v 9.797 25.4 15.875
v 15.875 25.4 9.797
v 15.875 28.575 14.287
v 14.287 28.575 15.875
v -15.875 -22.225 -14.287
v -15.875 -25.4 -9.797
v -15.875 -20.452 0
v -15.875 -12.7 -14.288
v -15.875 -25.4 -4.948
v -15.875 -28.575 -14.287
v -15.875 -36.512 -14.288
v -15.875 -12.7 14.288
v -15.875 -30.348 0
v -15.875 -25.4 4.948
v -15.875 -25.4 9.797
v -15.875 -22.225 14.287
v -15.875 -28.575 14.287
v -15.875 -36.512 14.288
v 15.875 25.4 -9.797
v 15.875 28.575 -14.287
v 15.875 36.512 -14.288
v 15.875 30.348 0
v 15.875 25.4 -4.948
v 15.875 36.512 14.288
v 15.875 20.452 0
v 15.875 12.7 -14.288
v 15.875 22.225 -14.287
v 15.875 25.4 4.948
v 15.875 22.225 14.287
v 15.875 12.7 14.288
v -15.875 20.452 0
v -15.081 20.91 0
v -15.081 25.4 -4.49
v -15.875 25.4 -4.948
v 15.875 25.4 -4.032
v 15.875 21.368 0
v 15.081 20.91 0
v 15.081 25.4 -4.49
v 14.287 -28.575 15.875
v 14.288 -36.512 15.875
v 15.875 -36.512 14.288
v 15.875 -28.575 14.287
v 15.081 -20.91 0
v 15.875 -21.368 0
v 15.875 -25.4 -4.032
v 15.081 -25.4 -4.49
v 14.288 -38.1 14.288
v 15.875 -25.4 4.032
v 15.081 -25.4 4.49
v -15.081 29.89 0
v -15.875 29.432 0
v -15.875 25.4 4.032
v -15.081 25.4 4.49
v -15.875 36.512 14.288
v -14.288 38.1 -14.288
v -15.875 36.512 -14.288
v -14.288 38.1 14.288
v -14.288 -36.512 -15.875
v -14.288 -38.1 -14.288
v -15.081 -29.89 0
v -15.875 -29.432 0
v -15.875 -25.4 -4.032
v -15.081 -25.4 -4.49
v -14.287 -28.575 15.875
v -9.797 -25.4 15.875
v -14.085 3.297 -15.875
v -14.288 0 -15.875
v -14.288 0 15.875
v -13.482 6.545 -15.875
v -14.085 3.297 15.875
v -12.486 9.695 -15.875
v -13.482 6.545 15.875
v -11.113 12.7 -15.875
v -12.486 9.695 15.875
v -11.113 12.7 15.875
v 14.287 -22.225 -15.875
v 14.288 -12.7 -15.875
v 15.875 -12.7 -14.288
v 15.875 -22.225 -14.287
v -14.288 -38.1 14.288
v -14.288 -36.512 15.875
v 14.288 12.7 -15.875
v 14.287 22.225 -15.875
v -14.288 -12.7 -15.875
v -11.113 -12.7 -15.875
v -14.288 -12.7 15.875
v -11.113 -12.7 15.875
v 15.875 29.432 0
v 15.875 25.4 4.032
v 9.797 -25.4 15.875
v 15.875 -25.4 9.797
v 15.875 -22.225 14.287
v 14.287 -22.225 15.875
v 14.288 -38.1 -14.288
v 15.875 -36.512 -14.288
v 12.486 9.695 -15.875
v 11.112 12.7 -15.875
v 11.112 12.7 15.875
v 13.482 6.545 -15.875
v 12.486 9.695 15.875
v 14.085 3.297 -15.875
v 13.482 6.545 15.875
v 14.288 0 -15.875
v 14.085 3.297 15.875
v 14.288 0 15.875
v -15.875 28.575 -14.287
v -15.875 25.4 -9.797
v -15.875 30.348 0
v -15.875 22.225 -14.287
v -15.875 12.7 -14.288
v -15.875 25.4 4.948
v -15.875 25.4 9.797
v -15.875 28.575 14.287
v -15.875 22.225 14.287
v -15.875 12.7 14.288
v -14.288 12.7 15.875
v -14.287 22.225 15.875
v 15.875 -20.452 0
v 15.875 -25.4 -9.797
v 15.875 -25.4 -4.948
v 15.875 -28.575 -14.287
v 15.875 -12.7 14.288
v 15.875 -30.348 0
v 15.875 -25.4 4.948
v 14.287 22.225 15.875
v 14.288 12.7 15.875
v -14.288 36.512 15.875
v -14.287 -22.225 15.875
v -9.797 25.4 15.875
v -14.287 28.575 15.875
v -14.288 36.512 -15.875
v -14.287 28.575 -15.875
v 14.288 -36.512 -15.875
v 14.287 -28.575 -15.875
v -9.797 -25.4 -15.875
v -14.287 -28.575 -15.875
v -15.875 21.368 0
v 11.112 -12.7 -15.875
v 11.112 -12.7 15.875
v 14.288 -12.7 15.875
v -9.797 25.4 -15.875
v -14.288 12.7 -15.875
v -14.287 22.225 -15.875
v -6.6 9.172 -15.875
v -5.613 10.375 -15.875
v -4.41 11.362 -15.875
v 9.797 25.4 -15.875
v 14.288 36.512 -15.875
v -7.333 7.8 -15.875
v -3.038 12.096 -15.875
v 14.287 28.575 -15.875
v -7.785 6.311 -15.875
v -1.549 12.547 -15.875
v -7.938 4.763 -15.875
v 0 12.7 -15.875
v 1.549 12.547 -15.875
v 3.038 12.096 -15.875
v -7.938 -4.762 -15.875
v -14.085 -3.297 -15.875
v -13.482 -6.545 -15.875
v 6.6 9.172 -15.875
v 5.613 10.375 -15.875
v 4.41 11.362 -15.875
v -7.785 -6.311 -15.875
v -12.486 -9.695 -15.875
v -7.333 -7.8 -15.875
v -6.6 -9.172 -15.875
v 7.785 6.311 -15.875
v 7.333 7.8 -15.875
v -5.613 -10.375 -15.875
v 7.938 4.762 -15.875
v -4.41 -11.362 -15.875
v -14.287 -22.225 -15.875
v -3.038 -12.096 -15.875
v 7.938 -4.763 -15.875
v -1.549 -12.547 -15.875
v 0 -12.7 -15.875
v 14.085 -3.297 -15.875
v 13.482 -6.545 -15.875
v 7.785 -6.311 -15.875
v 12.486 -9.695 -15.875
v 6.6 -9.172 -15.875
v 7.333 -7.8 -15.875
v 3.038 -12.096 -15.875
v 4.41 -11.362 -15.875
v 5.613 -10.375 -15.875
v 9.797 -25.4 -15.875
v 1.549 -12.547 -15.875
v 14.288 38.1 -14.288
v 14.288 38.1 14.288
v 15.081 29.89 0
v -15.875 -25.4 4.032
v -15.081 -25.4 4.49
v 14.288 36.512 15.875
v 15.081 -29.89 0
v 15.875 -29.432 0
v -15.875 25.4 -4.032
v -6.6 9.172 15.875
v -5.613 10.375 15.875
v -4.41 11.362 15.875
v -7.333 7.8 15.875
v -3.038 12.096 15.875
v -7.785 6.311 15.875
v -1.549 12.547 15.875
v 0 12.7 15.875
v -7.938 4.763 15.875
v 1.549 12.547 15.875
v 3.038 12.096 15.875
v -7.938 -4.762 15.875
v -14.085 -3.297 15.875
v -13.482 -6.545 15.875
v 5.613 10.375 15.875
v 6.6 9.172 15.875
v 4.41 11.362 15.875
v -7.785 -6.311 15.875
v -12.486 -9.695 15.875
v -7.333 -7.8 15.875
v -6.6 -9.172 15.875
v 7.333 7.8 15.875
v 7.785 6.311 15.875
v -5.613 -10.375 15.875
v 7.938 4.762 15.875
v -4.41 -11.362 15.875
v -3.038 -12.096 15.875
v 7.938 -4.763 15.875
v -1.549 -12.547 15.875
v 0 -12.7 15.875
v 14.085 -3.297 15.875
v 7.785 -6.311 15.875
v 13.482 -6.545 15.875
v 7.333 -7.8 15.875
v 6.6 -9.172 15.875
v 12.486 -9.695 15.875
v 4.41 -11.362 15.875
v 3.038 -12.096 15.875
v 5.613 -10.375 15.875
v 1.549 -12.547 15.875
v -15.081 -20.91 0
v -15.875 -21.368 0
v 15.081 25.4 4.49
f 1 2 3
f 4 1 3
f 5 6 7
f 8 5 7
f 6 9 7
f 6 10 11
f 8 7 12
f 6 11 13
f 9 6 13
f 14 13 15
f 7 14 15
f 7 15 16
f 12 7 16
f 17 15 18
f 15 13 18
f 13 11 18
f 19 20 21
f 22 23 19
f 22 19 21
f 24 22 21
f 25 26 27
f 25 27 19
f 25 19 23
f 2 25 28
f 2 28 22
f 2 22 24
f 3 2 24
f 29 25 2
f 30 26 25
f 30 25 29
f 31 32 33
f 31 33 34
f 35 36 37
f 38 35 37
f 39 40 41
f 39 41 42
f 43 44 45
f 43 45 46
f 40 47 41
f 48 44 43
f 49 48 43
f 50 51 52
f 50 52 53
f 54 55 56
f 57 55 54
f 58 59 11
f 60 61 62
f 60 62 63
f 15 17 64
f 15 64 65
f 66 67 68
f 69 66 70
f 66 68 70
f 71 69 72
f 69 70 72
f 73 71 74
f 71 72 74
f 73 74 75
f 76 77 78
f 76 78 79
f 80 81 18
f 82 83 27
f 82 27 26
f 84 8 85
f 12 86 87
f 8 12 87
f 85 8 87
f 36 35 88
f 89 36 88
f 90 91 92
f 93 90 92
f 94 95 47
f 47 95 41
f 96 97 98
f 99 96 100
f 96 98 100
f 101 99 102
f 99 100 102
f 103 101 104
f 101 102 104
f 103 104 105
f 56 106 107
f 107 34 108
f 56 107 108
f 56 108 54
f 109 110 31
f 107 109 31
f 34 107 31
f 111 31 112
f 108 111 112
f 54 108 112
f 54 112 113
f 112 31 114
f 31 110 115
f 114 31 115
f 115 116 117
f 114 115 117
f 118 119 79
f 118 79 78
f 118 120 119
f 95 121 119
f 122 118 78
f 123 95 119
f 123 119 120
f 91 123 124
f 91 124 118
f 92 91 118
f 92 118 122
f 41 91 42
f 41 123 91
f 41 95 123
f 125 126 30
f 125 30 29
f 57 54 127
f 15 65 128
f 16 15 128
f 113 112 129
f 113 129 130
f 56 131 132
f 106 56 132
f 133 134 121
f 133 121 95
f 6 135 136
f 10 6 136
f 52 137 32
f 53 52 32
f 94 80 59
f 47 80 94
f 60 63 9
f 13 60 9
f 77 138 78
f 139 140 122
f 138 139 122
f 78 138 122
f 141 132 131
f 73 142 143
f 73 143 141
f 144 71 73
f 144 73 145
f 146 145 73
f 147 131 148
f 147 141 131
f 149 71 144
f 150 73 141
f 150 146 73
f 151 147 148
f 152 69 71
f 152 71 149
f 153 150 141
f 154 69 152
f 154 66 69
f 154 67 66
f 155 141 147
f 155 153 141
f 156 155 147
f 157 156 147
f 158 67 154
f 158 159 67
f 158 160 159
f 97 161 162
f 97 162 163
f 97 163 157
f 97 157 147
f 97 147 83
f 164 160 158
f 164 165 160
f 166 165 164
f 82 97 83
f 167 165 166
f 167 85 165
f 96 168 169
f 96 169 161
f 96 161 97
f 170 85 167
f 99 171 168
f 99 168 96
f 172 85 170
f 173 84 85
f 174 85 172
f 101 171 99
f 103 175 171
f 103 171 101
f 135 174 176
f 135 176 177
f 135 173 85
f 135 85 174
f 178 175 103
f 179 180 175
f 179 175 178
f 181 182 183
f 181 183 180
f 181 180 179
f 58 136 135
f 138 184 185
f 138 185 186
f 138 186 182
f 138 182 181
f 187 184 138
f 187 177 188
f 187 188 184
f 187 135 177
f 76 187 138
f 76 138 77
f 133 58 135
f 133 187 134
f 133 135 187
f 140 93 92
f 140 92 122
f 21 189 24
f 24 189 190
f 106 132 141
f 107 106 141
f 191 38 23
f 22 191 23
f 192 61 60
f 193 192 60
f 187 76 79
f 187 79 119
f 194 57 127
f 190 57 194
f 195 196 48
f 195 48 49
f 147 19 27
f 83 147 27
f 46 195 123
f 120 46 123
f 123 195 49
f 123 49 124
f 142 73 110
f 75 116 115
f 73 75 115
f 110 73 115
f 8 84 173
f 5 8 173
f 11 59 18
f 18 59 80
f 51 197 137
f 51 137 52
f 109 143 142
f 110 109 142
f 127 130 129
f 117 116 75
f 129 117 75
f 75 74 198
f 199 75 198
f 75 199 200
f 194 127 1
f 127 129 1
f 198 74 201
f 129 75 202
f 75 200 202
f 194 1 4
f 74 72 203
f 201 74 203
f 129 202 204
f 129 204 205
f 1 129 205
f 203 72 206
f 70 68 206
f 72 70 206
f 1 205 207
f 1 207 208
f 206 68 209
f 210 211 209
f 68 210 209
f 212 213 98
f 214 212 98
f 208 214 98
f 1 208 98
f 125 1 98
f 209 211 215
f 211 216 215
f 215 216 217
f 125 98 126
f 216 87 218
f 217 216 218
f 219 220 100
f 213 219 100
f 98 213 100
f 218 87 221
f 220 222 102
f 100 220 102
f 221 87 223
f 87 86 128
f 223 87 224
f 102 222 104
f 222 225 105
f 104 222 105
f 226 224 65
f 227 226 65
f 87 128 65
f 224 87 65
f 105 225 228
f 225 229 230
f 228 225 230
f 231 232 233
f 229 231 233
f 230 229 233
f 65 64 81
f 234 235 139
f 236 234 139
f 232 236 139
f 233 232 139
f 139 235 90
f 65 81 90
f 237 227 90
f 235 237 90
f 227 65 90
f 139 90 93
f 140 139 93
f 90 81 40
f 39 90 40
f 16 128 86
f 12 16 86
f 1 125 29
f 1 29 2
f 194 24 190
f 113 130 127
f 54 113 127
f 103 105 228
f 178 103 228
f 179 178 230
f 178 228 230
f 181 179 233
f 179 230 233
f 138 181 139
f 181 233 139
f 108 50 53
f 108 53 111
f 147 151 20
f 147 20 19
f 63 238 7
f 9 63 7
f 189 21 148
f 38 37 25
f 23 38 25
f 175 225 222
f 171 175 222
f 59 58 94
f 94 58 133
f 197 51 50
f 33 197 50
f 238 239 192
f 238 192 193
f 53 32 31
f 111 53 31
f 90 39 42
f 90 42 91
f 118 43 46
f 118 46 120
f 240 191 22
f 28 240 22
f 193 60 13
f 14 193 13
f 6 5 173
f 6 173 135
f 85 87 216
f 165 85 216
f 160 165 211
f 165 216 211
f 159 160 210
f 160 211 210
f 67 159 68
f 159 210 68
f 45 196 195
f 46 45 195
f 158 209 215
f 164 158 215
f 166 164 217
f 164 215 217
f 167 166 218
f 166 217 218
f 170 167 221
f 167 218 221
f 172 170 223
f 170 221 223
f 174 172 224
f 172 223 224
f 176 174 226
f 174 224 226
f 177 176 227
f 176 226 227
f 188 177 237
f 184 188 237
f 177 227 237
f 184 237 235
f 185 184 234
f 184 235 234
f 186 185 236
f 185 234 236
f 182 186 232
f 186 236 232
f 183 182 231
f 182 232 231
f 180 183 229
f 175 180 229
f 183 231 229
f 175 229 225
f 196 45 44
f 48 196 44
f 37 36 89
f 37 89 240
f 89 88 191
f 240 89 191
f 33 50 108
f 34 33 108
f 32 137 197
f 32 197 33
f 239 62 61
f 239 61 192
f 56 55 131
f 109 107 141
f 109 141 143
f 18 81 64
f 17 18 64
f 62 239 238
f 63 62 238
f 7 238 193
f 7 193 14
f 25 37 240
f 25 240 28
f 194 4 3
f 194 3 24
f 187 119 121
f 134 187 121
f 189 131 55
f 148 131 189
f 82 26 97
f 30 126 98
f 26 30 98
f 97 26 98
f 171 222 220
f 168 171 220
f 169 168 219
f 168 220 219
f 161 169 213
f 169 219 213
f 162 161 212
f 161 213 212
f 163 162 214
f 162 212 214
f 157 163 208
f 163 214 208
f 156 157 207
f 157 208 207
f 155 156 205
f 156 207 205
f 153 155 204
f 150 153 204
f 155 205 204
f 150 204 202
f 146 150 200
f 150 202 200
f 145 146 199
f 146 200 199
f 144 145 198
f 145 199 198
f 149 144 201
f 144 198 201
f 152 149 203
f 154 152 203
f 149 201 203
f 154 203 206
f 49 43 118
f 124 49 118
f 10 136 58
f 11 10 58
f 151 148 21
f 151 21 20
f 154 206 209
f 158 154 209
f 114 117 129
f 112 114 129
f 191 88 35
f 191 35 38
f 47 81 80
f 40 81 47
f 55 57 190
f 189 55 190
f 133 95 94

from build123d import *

# Parameters (mm, degrees)
F0_W              = 31.75
F0_H              = 31.75
F1_DEPTH          = 38.1
F2_SIZE           = 1.5875
F4_DEPTH          = 31.751
F7_DEPTH          = 12.7
F10_DEPTH         = 12.7
F13_COPIES2_COUNT = 2


# Not quite as in the source:
# - a pattern or mirror of a feature is missing from the dataset's text; its kind, count and spacing are read off the source's solid


with BuildPart() as f1:
    # F0 (on Front) → F1 (new body, symmetric)
    with BuildSketch(Plane.XZ):
        Rectangle(F0_W, F0_H)
    extrude(amount=F1_DEPTH, both=True)

    # F2
    f2_edges = [f1.edges().sort_by_distance(p)[0] for p in [
        (0, -38.1, 15.875),
        (15.875, -38.1, 0),
        (15.875, 0, 15.875),
        (15.875, 0, -15.875),
        (-15.875, 0, 15.875),
        (-15.875, -38.1, 0),
        (0, -38.1, -15.875),
        (15.875, 38.1, 0),
        (-15.875, 38.1, 0),
        (0, 38.1, -15.875),
        (-15.875, 0, -15.875),
        (0, 38.1, 15.875),
    ]]
    chamfer(f2_edges, length=F2_SIZE)

    # F3 (on face) → F4 (cut, through all)
    with BuildSketch(Plane.XY.offset(15.875)):
        with BuildLine():
            Line((11.1125, -12.7), (14.2875, -12.7))
            Line((14.2875, -12.7), (14.2875, 1.197e-07))
            ThreePointArc((14.2875, 1.197e-07), (13.4817207372, -6.5454301226), (11.1125, -12.7))
        make_face()
        Polygon((14.2875, 1.197e-07), (14.2875, -12.7), (15.875, -12.7), (15.875, 12.7), (14.2875, 12.7), align=None)
        with BuildLine():
            ThreePointArc((11.1125, 12.7), (13.4817207082, 6.5454302387), (14.2875, 1.197e-07))
            Line((14.2875, 1.197e-07), (14.2875, 12.7))
            Line((14.2875, 12.7), (11.1125, 12.7))
        make_face()
        Polygon((-15.875, -12.7), (-14.2875, -12.7), (-14.2875, 1.197e-07), (-14.2875, 12.7), (-15.875, 12.7), align=None)
        with BuildLine():
            Line((-14.2875, 1.197e-07), (-14.2875, -12.7))
            Line((-14.2875, -12.7), (-11.1125, -12.7))
            ThreePointArc((-11.1125, -12.7), (-13.4817207372, -6.5454301226), (-14.2875, 1.197e-07))
        make_face()
        with BuildLine():
            Line((-14.2875, 12.7), (-14.2875, 1.197e-07))
            ThreePointArc((-14.2875, 1.197e-07), (-13.4817207082, 6.5454302387), (-11.1125, 12.7))
            Line((-11.1125, 12.7), (-14.2875, 12.7))
        make_face()
        with BuildLine():
            Line((-7.9375, 4.7625), (-7.9375, -4.7625))
            ThreePointArc((-7.9375, -4.7625), (0, -12.7), (7.9375, -4.7625))
            Line((7.9375, -4.7625), (7.9375, 4.7625))
            ThreePointArc((7.9375, 4.7625), (0, 12.7), (-7.9375, 4.7625))
        make_face()
    extrude(amount=-F4_DEPTH, mode=Mode.SUBTRACT)

    # F6 (on face) → F7 (cut, symmetric)
    with BuildSketch(Plane(origin=(0, 0, 0), x_dir=(0, 1, 0), z_dir=(0.7071067812, 0, 0.7071067812))):
        Polygon((-25.4, 18.1531082875), (-22.225, 21.3281082875), (-28.575, 21.3281082875), align=None)
        Polygon((-25.4, -18.1531082875), (-28.575, -21.3281082875), (-22.225, -21.3281082875), align=None)
        Polygon((22.225, -21.3281082875), (28.575, -21.3281082875), (25.4, -18.1531082875), align=None)
        Polygon((28.575, 21.3281082875), (22.225, 21.3281082875), (25.4, 18.1531082875), align=None)
    extrude(amount=F7_DEPTH, both=True, mode=Mode.SUBTRACT)

    # F9 (on face) → F10 (cut, symmetric)
    with BuildSketch(Plane(origin=(0, 0, 0), x_dir=(0, 1, 0), z_dir=(0.7071067812, 0, -0.7071067812))):
        Polygon((-25.4, 18.1531082875), (-22.225, 21.3281082875), (-28.575, 21.3281082875), align=None)
        Polygon((-28.575, -21.3281082875), (-22.225, -21.3281082875), (-25.4, -18.1531082875), align=None)
        Polygon((28.575, 21.3281082875), (22.225, 21.3281082875), (25.4, 18.1531082875), align=None)
        Polygon((25.4, -18.1531082875), (22.225, -21.3281082875), (28.575, -21.3281082875), align=None)
    extrude(amount=F10_DEPTH, both=True, mode=Mode.SUBTRACT)

    # F13: sweep along a path in F11
    with BuildLine(Plane(origin=(-15.875, 0, 0), x_dir=(0, -1, 0), z_dir=(-1, 0, 0))) as f13_path:
        Line((-25.4, 4.4901280605), (-29.8901280605, 0))
        Line((-29.8901280605, 0), (-25.4, -4.4901280605))
        Line((-25.4, -4.4901280605), (-20.9098719395, 0))
        Line((-20.9098719395, 0), (-25.4, 4.4901280605))
    # F12 (on Top) → F13 (sweep, cut)
    with BuildSketch(Plane.XY):
        Polygon((-15.875, 29.4318562844), (-15.08125, 29.8901280605), (-15.875, 30.3483998367), align=None)
    f13 = sweep(path=f13_path.line, transition=Transition.RIGHT, mode=Mode.SUBTRACT)

    # F13_copies: F13 across plane
    add(f13.mirror(Plane(origin=(0, 0, 0), x_dir=(0, 0, 1), z_dir=(1, 0, 0))), mode=Mode.SUBTRACT)

    # F13_copies1: F13 across plane
    add(f13.mirror(Plane(origin=(0, 0, 0), x_dir=(0, 0, -1), z_dir=(0, -1, 0))), mode=Mode.SUBTRACT)

    # F13_copies2: F13 ×2 about axis
    f13_copies2_axis = Axis((0, 0, 0), (0, 0, 1))
    for i in range(1, F13_COPIES2_COUNT):
        add(f13.rotate(f13_copies2_axis, i * 360 / F13_COPIES2_COUNT), mode=Mode.SUBTRACT)


solid = f1.part
